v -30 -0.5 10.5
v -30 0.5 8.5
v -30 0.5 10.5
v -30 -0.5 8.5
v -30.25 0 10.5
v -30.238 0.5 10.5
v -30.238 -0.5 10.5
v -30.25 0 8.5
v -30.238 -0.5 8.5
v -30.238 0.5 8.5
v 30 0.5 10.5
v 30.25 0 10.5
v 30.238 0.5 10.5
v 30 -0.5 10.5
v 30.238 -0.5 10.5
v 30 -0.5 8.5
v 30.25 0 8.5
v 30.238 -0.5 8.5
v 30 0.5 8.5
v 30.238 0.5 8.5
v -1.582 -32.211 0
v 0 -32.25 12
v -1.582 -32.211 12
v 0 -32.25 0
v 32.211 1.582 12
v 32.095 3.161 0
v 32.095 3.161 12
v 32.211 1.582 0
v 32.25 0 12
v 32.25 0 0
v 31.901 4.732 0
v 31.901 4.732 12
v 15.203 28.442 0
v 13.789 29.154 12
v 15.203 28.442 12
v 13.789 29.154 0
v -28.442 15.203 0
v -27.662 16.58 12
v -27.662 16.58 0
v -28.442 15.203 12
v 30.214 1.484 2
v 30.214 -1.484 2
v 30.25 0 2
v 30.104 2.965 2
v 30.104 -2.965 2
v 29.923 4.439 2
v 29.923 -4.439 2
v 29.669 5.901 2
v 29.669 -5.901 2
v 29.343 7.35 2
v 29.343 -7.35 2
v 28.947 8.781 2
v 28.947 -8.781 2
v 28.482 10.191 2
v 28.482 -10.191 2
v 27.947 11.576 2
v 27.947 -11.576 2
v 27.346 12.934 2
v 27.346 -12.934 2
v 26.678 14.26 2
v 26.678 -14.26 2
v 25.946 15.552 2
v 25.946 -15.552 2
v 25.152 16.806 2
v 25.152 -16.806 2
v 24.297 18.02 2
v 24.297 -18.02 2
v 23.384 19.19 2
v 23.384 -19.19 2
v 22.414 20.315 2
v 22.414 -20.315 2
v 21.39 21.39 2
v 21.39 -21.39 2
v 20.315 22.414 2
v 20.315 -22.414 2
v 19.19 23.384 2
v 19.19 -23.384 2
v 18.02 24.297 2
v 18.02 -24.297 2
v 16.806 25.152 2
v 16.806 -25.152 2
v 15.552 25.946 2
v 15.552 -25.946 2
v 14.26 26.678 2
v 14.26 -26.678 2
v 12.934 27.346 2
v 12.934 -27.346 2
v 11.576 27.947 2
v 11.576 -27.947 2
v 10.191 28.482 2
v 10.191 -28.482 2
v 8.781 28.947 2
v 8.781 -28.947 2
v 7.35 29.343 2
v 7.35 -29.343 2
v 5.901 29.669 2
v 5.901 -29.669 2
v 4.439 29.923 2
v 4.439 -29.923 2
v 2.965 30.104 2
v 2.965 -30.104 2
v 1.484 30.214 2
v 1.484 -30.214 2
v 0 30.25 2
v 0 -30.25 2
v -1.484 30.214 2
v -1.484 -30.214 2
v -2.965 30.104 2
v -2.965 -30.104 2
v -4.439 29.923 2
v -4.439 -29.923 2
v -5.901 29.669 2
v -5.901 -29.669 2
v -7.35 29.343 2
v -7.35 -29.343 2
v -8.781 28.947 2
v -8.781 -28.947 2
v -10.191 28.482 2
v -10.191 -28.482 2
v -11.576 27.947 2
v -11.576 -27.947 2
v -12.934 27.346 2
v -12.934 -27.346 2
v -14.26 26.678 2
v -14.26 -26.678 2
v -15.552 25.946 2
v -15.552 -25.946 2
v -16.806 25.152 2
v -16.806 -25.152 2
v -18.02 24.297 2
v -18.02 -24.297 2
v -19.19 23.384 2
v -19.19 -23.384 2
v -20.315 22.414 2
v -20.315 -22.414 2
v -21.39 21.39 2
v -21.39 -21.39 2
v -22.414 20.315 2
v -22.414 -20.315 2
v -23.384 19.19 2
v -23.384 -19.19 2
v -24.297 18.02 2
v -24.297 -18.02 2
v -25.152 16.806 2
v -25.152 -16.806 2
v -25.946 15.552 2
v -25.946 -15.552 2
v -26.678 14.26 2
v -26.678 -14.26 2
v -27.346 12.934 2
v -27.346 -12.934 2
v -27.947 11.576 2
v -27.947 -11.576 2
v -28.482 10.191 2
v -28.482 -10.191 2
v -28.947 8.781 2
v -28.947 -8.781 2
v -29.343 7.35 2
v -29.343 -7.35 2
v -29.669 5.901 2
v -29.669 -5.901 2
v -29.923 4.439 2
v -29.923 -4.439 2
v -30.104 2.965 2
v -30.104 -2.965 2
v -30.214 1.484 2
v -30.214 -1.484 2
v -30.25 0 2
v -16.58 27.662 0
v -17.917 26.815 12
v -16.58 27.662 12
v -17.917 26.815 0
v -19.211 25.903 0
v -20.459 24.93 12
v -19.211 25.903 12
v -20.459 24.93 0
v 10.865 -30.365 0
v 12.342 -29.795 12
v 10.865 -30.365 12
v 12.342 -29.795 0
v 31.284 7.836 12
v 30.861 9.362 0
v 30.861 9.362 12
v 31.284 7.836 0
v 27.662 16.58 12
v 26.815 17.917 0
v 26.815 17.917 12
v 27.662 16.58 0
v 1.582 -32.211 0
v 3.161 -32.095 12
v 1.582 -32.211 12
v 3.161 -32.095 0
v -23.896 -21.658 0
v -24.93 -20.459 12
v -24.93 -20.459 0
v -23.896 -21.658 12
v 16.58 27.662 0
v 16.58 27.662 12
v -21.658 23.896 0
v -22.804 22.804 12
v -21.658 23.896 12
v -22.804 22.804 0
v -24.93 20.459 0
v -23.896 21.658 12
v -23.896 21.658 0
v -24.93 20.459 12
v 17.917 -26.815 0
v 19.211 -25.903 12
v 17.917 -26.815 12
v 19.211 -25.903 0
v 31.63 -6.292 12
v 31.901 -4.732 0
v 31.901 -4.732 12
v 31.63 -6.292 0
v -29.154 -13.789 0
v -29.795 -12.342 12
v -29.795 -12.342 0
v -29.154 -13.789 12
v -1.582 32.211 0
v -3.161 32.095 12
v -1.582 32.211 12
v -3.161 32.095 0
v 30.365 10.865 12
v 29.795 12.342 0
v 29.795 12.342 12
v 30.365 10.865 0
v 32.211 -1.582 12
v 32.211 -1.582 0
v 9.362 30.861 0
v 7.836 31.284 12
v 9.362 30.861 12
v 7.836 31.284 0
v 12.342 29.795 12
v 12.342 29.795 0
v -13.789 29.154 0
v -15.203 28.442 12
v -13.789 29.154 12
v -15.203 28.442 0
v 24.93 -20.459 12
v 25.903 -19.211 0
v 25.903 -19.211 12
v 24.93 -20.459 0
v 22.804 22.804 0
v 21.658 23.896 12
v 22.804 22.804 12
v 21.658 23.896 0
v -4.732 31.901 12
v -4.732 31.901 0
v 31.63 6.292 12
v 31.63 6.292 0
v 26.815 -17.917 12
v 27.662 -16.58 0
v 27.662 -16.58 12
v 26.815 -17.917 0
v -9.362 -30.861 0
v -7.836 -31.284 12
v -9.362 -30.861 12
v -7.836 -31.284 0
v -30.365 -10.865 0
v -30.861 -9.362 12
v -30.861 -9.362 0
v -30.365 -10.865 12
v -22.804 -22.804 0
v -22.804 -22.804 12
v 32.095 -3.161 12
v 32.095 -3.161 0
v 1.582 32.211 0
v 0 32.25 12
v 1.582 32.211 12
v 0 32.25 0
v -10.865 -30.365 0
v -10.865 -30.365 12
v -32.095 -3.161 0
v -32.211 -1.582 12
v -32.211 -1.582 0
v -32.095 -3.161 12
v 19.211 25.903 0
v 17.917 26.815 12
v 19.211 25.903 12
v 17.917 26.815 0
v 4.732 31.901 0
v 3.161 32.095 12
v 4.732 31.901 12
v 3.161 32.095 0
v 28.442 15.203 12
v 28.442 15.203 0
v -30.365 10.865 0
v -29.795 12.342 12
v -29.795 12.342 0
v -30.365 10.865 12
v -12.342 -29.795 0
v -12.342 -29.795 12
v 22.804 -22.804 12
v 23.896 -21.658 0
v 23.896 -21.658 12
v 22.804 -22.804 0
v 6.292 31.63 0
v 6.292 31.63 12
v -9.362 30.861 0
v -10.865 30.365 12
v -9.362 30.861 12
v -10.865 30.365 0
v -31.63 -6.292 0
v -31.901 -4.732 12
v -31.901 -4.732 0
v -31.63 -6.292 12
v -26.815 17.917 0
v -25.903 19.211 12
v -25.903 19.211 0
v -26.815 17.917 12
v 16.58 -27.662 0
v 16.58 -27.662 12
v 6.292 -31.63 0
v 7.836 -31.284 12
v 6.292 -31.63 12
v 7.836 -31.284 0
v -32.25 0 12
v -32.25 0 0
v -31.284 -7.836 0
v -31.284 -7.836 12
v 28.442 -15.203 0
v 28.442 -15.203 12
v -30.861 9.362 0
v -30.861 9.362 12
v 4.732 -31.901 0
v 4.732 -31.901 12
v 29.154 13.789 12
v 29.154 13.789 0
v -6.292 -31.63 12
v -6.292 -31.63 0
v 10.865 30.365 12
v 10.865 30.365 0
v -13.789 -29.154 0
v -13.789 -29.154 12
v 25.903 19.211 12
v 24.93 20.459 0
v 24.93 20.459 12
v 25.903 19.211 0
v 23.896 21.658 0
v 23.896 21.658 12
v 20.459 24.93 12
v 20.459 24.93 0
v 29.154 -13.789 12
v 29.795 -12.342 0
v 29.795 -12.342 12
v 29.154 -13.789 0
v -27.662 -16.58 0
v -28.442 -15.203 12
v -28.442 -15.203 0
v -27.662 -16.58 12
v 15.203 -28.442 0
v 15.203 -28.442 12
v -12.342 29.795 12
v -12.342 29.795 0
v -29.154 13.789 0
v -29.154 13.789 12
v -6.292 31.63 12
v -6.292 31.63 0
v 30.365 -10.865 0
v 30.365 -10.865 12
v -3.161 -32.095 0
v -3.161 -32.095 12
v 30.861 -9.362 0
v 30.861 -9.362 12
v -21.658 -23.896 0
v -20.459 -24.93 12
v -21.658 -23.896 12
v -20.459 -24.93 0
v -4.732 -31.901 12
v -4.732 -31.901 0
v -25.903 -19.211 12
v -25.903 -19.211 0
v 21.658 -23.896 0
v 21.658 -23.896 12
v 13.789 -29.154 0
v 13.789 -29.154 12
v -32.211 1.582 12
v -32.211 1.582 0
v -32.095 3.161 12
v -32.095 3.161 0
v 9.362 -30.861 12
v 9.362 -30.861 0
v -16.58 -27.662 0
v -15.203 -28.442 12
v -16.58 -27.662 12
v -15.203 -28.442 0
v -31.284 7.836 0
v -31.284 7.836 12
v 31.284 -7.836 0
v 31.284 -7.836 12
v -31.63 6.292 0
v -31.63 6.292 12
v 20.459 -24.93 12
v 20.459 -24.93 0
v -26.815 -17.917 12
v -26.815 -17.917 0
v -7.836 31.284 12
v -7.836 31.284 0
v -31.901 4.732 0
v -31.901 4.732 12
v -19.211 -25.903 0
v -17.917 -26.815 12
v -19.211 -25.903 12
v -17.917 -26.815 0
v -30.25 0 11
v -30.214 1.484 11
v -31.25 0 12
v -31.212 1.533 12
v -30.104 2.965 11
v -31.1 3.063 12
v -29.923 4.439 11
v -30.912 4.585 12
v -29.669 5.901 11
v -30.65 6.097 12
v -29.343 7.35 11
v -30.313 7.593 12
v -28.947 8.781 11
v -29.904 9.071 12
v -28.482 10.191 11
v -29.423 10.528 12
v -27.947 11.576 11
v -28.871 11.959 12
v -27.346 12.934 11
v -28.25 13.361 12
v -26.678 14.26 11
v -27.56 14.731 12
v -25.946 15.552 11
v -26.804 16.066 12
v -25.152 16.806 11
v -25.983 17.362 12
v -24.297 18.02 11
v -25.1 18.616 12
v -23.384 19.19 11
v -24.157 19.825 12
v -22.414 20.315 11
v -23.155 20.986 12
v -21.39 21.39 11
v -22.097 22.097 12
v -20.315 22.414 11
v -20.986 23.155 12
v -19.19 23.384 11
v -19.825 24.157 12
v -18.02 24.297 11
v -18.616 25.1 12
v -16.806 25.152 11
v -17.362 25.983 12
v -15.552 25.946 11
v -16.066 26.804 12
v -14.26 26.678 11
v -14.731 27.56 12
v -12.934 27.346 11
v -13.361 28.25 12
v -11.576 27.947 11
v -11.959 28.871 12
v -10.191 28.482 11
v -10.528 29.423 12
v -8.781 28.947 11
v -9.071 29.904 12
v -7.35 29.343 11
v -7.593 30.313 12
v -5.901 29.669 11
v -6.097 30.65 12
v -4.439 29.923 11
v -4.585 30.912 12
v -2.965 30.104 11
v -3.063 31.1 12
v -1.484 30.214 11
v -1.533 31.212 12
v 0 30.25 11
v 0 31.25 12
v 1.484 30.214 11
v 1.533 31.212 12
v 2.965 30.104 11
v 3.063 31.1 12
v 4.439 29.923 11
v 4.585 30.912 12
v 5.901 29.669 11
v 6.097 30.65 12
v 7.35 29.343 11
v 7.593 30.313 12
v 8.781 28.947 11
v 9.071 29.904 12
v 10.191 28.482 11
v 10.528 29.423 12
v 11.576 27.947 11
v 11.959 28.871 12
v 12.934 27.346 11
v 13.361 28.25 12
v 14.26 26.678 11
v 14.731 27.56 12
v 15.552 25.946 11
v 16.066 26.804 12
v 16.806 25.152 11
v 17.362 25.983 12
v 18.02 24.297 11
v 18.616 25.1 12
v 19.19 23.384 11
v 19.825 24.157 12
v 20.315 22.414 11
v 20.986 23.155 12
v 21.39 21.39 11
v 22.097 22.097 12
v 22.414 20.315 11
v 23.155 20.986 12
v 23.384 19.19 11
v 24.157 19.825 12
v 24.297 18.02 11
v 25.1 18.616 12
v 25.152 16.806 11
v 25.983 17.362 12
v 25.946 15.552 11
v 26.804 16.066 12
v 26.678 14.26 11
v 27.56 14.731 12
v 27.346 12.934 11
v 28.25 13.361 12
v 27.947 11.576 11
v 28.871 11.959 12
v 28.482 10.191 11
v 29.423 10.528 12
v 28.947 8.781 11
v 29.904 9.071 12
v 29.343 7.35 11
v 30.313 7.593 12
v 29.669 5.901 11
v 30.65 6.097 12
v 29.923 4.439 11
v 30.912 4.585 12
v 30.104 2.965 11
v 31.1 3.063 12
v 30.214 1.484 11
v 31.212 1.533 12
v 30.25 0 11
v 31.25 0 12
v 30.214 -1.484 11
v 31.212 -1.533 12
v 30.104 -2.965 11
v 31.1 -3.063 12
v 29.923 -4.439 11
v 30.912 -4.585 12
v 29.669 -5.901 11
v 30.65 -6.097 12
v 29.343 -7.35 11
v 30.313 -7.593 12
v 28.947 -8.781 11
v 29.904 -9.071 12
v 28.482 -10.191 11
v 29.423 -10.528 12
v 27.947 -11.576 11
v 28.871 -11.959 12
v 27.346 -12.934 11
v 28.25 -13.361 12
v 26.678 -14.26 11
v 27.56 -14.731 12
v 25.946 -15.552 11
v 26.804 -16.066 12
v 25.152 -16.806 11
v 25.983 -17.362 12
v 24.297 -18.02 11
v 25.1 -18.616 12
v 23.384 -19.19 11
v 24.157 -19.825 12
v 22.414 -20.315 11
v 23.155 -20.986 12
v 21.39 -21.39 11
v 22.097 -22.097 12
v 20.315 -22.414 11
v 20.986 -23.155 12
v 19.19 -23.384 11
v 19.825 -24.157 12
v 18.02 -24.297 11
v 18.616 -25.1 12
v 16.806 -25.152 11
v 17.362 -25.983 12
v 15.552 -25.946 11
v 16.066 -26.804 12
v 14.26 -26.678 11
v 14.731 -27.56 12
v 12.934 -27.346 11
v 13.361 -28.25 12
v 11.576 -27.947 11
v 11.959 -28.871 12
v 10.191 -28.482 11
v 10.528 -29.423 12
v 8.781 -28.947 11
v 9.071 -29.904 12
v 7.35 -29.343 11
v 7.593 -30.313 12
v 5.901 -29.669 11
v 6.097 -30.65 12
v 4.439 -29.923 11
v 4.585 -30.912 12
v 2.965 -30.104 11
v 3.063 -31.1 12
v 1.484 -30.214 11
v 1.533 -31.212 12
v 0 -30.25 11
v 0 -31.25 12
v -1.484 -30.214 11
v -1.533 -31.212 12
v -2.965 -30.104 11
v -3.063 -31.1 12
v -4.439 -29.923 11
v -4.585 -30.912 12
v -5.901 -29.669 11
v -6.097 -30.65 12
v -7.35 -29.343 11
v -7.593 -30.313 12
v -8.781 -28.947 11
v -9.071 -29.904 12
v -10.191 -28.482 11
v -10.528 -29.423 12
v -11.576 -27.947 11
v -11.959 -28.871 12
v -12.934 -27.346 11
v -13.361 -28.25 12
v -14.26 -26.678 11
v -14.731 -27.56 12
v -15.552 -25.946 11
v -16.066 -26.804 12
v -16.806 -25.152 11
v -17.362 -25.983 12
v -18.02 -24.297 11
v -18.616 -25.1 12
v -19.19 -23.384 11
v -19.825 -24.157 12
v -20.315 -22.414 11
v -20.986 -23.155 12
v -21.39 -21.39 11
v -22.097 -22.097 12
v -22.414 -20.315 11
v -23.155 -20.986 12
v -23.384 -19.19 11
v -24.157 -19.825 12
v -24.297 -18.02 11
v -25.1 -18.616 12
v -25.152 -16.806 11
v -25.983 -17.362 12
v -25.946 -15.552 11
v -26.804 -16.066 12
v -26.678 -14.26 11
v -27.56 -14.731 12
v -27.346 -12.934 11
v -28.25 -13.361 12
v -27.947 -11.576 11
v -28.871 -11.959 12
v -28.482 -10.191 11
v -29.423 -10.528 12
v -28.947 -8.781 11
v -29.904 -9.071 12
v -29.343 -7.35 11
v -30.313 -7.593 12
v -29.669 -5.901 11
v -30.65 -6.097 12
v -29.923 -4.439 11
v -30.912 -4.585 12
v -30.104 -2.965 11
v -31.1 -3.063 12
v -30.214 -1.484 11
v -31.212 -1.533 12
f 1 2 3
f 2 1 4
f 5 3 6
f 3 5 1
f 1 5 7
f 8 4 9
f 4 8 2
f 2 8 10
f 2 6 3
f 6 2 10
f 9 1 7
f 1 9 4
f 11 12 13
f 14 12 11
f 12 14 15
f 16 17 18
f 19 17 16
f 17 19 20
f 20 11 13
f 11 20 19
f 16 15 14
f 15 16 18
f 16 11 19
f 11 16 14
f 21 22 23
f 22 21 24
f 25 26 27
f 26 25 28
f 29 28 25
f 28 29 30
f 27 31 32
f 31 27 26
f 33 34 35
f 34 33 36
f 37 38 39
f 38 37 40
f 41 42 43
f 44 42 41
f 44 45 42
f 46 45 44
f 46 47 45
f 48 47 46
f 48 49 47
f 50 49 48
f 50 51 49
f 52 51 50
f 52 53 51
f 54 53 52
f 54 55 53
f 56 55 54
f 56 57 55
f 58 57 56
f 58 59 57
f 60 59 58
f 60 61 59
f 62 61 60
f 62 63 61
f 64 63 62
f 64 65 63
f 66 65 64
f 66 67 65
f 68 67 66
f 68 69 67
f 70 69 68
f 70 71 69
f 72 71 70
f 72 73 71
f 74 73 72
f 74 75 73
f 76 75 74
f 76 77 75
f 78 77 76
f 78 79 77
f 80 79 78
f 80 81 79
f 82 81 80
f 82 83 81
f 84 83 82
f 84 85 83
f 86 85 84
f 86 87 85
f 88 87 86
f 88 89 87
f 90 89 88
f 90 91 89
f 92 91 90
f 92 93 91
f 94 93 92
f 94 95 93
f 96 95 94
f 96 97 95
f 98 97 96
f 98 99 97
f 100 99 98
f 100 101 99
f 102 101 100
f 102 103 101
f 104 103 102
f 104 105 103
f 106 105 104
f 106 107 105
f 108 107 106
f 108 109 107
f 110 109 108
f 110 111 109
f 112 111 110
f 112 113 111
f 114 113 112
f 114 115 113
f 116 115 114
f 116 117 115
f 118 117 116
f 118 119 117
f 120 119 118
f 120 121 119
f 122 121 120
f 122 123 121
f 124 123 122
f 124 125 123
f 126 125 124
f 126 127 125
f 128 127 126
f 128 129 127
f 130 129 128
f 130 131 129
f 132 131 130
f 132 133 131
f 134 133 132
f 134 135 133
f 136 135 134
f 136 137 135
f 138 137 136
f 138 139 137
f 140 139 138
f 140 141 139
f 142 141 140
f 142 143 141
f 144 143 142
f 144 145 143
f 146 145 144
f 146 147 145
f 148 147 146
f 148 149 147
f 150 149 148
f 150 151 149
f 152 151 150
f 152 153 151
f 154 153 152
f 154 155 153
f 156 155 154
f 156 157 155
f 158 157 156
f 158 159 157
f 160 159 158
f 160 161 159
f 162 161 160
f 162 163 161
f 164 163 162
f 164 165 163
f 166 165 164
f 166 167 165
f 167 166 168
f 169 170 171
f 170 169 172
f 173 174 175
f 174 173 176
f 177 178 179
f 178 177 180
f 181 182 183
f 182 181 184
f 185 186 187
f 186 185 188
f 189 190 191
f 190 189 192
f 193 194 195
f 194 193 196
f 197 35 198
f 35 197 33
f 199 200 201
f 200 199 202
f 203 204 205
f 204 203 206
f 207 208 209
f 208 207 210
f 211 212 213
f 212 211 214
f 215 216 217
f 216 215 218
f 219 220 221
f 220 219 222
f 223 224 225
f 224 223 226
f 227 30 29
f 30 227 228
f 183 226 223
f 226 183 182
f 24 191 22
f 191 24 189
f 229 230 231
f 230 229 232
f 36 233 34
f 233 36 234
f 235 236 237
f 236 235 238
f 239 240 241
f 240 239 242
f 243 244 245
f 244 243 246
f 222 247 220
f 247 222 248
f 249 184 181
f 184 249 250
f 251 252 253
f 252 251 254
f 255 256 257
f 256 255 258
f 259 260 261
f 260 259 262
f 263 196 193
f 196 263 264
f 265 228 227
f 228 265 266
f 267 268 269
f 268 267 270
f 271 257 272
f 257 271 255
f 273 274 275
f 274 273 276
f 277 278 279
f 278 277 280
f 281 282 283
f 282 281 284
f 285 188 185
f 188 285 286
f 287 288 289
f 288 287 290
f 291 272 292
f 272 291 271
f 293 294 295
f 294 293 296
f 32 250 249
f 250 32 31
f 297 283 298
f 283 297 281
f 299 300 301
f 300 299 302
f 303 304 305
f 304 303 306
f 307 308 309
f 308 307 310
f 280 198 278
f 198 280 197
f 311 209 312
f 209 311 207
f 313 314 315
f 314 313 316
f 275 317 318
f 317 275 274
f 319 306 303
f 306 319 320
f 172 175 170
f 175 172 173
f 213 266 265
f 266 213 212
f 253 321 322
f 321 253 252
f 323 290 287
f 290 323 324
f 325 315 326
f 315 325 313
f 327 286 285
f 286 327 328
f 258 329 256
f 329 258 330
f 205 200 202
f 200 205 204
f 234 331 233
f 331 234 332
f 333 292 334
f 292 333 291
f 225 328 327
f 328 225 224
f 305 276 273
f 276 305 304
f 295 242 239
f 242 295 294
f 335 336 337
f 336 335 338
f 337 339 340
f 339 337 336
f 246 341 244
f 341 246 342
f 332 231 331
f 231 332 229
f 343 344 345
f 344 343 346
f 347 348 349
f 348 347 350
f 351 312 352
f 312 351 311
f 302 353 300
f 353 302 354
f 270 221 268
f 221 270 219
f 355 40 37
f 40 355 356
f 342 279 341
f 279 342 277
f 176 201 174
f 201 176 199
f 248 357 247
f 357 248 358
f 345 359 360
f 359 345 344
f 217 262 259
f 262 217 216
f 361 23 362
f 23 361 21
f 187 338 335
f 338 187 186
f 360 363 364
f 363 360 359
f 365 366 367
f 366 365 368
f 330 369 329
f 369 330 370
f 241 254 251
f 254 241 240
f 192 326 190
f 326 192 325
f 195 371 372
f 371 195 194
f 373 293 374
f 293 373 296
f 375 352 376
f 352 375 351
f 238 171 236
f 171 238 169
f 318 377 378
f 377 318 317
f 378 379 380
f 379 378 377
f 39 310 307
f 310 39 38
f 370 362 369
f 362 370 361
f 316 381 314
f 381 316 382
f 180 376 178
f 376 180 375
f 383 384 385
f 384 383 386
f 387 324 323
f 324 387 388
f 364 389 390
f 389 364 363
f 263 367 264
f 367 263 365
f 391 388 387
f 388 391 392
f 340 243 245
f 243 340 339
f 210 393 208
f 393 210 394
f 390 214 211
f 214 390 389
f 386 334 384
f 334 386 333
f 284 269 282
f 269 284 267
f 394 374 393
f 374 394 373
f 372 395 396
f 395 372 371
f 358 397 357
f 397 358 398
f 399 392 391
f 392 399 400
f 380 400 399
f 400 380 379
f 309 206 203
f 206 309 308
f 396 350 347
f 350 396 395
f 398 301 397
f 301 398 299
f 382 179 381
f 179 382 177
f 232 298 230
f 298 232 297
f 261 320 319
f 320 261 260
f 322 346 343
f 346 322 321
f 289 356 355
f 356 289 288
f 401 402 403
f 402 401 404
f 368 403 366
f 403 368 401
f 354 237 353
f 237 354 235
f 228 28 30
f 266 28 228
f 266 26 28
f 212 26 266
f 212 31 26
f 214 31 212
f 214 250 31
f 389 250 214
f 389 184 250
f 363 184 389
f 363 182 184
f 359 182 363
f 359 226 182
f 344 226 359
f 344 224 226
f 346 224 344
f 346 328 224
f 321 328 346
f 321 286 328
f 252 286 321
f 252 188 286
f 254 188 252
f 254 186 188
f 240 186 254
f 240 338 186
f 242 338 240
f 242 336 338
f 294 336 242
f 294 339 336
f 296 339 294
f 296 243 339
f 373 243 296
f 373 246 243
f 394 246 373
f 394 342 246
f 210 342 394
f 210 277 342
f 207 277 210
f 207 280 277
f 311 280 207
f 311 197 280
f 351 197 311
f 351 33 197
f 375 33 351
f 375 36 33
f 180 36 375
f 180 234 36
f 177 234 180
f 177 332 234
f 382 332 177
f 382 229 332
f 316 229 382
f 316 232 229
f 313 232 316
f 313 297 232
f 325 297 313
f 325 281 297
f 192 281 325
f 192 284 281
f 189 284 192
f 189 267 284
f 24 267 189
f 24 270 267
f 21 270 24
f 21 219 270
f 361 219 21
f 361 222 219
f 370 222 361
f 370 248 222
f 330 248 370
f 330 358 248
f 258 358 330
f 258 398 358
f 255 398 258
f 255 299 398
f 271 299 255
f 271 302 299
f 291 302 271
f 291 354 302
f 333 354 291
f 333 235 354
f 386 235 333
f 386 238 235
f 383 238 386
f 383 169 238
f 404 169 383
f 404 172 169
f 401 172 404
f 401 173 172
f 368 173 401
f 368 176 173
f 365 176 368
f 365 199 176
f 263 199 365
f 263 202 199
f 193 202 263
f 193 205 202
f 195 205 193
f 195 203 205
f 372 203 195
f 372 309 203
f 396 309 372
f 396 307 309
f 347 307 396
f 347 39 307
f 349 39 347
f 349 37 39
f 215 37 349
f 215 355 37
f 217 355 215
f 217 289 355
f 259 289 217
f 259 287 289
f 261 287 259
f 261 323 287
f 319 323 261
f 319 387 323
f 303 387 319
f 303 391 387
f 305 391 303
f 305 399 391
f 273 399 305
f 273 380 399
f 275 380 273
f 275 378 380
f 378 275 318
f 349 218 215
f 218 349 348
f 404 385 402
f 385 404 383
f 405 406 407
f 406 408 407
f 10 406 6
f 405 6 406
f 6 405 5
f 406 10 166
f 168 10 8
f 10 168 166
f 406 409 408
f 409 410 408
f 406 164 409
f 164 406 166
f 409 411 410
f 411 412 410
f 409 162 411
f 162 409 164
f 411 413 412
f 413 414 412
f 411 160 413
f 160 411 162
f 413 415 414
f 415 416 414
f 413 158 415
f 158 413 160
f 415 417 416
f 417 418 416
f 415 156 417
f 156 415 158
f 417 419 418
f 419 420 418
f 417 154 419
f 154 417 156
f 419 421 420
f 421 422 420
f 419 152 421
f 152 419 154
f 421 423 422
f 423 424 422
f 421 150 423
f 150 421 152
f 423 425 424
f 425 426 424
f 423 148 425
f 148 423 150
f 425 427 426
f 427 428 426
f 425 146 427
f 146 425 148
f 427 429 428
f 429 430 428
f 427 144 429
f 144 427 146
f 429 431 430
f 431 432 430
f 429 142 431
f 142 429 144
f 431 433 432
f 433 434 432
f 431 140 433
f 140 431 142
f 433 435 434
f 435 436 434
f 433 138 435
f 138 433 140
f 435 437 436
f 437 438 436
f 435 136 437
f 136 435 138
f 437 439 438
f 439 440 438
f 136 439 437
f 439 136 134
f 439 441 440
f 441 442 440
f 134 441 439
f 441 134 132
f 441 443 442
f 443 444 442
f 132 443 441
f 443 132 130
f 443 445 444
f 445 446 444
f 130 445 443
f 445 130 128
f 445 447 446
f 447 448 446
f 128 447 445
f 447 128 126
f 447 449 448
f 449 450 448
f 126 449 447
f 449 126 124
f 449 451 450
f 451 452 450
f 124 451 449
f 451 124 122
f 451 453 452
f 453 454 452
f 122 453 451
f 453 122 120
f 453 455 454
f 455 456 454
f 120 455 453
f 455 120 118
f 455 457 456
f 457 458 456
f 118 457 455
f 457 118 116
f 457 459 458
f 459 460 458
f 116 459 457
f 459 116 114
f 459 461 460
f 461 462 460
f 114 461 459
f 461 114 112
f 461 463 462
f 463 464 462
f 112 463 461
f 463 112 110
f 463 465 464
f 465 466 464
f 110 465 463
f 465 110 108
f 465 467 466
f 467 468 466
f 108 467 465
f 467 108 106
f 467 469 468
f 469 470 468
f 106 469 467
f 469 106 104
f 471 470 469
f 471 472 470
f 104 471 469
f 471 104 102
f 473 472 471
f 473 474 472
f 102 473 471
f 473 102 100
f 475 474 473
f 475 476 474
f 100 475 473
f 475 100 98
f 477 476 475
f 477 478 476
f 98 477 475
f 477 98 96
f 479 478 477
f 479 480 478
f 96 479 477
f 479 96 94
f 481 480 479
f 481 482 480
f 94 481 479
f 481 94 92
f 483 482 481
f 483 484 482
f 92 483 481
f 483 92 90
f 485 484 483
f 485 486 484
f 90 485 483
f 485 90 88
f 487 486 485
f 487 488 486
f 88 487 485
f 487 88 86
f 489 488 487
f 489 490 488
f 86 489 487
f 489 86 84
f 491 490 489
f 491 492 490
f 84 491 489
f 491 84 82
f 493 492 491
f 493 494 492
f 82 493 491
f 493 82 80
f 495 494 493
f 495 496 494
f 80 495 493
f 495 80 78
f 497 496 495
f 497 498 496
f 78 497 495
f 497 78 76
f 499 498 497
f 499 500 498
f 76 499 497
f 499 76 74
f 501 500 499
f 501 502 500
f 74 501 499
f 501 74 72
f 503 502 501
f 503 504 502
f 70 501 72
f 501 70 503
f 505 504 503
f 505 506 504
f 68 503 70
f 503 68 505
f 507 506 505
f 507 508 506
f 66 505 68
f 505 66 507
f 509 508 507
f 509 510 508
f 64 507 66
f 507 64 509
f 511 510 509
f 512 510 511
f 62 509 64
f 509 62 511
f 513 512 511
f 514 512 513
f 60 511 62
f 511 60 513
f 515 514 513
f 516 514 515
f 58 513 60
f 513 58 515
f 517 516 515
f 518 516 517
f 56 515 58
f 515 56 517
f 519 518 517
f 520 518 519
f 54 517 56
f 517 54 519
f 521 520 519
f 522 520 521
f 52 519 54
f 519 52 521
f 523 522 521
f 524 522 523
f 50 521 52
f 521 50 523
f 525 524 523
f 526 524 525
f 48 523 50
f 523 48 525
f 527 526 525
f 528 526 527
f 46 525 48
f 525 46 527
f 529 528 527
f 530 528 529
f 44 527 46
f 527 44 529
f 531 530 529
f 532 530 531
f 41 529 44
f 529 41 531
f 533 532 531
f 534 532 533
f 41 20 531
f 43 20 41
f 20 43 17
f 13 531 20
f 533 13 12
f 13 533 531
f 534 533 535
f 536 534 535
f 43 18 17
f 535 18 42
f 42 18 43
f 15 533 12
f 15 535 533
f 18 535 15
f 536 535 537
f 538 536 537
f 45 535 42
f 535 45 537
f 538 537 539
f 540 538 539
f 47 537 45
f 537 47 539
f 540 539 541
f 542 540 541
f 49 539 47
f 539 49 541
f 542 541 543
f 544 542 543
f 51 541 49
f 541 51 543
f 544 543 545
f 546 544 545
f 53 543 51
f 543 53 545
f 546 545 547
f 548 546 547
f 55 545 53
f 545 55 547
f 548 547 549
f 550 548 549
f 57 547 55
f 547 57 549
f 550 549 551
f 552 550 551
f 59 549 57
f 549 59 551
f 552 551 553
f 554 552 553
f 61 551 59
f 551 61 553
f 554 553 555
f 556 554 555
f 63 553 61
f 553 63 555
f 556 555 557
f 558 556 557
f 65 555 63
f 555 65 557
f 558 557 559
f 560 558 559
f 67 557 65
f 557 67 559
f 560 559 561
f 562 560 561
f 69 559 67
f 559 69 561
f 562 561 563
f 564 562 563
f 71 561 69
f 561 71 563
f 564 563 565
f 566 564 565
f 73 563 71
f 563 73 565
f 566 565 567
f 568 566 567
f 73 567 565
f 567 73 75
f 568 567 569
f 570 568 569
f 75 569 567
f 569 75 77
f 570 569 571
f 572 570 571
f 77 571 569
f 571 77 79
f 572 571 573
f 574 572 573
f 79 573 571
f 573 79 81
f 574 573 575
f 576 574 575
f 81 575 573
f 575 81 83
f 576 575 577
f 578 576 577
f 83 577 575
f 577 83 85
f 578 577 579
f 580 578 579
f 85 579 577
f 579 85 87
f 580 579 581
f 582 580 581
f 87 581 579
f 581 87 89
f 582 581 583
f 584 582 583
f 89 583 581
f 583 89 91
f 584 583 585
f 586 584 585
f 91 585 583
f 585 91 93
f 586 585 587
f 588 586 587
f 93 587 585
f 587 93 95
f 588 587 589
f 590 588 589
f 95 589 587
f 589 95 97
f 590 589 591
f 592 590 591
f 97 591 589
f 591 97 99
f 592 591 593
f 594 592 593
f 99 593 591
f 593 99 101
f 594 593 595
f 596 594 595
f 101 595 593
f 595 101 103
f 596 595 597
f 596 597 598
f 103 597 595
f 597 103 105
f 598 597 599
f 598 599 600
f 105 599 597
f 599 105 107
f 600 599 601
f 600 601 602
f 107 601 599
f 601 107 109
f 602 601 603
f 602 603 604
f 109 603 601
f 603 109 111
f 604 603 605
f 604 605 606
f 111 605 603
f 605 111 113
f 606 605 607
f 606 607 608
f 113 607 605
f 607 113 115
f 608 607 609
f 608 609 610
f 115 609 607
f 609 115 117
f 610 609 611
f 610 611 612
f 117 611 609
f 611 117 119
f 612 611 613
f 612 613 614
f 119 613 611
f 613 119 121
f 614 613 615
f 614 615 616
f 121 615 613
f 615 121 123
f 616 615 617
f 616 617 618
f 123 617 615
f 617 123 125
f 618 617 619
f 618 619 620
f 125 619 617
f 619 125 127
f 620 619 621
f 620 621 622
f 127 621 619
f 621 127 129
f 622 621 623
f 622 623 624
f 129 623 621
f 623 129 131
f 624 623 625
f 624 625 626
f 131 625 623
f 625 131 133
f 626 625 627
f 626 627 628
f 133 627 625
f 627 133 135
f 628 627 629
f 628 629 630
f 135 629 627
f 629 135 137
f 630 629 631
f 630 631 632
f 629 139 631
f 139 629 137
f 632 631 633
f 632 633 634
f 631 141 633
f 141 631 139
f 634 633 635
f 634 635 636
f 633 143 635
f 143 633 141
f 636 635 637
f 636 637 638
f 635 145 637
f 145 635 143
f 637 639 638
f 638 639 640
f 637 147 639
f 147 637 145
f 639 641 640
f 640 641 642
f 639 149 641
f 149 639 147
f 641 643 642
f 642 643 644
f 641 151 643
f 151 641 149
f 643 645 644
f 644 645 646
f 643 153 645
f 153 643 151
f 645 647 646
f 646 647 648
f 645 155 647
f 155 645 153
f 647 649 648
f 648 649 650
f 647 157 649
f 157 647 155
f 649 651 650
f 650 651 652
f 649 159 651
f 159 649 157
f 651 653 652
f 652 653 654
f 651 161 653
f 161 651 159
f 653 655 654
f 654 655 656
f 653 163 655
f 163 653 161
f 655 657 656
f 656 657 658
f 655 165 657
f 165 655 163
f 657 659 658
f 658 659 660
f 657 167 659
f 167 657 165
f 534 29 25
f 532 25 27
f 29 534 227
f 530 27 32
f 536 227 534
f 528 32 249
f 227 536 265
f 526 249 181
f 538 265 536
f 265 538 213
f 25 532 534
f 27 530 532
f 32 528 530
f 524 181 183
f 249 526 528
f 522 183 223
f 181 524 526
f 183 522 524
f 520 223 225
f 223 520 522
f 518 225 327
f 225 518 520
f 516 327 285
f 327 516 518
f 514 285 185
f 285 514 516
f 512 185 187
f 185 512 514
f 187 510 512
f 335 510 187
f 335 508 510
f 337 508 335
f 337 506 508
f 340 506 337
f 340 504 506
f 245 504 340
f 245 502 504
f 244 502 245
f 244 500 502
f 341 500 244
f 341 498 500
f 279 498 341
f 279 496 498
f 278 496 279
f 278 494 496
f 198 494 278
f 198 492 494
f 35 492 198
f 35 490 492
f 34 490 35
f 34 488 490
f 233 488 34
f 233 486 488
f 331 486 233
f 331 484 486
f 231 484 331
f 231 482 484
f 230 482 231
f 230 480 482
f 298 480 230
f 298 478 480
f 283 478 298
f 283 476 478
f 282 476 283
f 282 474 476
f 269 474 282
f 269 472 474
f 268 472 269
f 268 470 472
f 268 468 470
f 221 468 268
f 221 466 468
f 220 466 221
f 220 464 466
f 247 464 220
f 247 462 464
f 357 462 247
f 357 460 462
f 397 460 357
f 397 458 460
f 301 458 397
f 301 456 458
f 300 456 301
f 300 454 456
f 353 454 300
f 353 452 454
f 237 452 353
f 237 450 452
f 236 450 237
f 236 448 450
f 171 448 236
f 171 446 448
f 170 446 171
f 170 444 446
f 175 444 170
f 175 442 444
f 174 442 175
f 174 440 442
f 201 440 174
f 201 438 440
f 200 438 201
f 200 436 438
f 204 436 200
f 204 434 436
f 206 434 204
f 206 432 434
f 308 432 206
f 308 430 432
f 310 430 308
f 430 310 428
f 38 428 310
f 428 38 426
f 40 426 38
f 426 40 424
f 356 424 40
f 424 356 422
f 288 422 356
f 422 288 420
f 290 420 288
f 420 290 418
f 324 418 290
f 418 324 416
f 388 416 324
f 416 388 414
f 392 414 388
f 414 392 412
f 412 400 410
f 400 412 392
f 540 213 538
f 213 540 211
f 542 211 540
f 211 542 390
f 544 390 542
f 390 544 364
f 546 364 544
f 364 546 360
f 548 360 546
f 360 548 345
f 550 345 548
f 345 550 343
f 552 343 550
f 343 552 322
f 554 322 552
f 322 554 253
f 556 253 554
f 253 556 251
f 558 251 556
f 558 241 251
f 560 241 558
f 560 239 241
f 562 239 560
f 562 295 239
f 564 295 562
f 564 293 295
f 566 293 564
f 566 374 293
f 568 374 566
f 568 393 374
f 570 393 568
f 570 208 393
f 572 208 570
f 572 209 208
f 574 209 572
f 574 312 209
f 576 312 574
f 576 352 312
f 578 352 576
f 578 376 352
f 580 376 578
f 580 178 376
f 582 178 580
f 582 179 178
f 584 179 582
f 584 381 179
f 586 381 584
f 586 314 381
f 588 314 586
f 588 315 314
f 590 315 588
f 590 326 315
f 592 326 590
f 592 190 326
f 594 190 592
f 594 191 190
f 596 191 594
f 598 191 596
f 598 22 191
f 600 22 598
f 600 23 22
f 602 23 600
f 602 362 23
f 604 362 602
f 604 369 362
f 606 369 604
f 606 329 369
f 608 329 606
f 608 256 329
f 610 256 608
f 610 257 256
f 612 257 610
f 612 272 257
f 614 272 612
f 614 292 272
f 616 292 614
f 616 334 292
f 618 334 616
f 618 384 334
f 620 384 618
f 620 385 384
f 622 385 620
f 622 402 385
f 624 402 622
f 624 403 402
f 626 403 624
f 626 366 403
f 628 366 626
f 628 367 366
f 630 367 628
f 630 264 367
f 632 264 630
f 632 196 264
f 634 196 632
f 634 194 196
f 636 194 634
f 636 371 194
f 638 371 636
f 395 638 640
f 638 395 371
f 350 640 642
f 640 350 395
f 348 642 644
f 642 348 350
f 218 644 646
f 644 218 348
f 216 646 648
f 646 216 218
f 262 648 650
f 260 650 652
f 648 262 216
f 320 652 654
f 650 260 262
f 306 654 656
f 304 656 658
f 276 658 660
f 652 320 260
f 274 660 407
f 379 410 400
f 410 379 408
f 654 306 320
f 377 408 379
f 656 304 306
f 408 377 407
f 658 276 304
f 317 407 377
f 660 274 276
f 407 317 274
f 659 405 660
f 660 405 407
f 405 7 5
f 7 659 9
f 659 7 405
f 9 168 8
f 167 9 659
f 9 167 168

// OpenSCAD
lensDiameter = 60;
tolerance = 0.25;
thickness = 2;
capDepth = 10;
bumpDepth = 0.25;
bumpPosition = 6.5;

module annulus(d1,d2) {
    difference() {
        circle(d=max(d1,d2));
        circle(d=min(d1,d2));
    }
}

module chamferedRing(d1,d2,h,inside=false) {
    D = max(d1,d2);
    d = min(d1,d2);
    w = (D-d)/2;
    h1 = inside?h:h-w/2;
    h2 = inside?h-w/2:h;
    rotate_extrude() polygon([[d/2,0],[D/2,0],[D/2,h1],[(d+D)/4,h],[d/2,h2]]);
}

$fn = 128;

D = tolerance*2 + thickness*2 + lensDiameter;
cylinder(d=D,h=thickness);
chamferedRing(D,lensDiameter+2*tolerance,thickness+capDepth,inside=true);
for (a=[0,180]) rotate([0,0,a]) 
translate([-lensDiameter/2-tolerance,-0.5,bumpPosition+thickness]) cube([bumpDepth,1,2]);
